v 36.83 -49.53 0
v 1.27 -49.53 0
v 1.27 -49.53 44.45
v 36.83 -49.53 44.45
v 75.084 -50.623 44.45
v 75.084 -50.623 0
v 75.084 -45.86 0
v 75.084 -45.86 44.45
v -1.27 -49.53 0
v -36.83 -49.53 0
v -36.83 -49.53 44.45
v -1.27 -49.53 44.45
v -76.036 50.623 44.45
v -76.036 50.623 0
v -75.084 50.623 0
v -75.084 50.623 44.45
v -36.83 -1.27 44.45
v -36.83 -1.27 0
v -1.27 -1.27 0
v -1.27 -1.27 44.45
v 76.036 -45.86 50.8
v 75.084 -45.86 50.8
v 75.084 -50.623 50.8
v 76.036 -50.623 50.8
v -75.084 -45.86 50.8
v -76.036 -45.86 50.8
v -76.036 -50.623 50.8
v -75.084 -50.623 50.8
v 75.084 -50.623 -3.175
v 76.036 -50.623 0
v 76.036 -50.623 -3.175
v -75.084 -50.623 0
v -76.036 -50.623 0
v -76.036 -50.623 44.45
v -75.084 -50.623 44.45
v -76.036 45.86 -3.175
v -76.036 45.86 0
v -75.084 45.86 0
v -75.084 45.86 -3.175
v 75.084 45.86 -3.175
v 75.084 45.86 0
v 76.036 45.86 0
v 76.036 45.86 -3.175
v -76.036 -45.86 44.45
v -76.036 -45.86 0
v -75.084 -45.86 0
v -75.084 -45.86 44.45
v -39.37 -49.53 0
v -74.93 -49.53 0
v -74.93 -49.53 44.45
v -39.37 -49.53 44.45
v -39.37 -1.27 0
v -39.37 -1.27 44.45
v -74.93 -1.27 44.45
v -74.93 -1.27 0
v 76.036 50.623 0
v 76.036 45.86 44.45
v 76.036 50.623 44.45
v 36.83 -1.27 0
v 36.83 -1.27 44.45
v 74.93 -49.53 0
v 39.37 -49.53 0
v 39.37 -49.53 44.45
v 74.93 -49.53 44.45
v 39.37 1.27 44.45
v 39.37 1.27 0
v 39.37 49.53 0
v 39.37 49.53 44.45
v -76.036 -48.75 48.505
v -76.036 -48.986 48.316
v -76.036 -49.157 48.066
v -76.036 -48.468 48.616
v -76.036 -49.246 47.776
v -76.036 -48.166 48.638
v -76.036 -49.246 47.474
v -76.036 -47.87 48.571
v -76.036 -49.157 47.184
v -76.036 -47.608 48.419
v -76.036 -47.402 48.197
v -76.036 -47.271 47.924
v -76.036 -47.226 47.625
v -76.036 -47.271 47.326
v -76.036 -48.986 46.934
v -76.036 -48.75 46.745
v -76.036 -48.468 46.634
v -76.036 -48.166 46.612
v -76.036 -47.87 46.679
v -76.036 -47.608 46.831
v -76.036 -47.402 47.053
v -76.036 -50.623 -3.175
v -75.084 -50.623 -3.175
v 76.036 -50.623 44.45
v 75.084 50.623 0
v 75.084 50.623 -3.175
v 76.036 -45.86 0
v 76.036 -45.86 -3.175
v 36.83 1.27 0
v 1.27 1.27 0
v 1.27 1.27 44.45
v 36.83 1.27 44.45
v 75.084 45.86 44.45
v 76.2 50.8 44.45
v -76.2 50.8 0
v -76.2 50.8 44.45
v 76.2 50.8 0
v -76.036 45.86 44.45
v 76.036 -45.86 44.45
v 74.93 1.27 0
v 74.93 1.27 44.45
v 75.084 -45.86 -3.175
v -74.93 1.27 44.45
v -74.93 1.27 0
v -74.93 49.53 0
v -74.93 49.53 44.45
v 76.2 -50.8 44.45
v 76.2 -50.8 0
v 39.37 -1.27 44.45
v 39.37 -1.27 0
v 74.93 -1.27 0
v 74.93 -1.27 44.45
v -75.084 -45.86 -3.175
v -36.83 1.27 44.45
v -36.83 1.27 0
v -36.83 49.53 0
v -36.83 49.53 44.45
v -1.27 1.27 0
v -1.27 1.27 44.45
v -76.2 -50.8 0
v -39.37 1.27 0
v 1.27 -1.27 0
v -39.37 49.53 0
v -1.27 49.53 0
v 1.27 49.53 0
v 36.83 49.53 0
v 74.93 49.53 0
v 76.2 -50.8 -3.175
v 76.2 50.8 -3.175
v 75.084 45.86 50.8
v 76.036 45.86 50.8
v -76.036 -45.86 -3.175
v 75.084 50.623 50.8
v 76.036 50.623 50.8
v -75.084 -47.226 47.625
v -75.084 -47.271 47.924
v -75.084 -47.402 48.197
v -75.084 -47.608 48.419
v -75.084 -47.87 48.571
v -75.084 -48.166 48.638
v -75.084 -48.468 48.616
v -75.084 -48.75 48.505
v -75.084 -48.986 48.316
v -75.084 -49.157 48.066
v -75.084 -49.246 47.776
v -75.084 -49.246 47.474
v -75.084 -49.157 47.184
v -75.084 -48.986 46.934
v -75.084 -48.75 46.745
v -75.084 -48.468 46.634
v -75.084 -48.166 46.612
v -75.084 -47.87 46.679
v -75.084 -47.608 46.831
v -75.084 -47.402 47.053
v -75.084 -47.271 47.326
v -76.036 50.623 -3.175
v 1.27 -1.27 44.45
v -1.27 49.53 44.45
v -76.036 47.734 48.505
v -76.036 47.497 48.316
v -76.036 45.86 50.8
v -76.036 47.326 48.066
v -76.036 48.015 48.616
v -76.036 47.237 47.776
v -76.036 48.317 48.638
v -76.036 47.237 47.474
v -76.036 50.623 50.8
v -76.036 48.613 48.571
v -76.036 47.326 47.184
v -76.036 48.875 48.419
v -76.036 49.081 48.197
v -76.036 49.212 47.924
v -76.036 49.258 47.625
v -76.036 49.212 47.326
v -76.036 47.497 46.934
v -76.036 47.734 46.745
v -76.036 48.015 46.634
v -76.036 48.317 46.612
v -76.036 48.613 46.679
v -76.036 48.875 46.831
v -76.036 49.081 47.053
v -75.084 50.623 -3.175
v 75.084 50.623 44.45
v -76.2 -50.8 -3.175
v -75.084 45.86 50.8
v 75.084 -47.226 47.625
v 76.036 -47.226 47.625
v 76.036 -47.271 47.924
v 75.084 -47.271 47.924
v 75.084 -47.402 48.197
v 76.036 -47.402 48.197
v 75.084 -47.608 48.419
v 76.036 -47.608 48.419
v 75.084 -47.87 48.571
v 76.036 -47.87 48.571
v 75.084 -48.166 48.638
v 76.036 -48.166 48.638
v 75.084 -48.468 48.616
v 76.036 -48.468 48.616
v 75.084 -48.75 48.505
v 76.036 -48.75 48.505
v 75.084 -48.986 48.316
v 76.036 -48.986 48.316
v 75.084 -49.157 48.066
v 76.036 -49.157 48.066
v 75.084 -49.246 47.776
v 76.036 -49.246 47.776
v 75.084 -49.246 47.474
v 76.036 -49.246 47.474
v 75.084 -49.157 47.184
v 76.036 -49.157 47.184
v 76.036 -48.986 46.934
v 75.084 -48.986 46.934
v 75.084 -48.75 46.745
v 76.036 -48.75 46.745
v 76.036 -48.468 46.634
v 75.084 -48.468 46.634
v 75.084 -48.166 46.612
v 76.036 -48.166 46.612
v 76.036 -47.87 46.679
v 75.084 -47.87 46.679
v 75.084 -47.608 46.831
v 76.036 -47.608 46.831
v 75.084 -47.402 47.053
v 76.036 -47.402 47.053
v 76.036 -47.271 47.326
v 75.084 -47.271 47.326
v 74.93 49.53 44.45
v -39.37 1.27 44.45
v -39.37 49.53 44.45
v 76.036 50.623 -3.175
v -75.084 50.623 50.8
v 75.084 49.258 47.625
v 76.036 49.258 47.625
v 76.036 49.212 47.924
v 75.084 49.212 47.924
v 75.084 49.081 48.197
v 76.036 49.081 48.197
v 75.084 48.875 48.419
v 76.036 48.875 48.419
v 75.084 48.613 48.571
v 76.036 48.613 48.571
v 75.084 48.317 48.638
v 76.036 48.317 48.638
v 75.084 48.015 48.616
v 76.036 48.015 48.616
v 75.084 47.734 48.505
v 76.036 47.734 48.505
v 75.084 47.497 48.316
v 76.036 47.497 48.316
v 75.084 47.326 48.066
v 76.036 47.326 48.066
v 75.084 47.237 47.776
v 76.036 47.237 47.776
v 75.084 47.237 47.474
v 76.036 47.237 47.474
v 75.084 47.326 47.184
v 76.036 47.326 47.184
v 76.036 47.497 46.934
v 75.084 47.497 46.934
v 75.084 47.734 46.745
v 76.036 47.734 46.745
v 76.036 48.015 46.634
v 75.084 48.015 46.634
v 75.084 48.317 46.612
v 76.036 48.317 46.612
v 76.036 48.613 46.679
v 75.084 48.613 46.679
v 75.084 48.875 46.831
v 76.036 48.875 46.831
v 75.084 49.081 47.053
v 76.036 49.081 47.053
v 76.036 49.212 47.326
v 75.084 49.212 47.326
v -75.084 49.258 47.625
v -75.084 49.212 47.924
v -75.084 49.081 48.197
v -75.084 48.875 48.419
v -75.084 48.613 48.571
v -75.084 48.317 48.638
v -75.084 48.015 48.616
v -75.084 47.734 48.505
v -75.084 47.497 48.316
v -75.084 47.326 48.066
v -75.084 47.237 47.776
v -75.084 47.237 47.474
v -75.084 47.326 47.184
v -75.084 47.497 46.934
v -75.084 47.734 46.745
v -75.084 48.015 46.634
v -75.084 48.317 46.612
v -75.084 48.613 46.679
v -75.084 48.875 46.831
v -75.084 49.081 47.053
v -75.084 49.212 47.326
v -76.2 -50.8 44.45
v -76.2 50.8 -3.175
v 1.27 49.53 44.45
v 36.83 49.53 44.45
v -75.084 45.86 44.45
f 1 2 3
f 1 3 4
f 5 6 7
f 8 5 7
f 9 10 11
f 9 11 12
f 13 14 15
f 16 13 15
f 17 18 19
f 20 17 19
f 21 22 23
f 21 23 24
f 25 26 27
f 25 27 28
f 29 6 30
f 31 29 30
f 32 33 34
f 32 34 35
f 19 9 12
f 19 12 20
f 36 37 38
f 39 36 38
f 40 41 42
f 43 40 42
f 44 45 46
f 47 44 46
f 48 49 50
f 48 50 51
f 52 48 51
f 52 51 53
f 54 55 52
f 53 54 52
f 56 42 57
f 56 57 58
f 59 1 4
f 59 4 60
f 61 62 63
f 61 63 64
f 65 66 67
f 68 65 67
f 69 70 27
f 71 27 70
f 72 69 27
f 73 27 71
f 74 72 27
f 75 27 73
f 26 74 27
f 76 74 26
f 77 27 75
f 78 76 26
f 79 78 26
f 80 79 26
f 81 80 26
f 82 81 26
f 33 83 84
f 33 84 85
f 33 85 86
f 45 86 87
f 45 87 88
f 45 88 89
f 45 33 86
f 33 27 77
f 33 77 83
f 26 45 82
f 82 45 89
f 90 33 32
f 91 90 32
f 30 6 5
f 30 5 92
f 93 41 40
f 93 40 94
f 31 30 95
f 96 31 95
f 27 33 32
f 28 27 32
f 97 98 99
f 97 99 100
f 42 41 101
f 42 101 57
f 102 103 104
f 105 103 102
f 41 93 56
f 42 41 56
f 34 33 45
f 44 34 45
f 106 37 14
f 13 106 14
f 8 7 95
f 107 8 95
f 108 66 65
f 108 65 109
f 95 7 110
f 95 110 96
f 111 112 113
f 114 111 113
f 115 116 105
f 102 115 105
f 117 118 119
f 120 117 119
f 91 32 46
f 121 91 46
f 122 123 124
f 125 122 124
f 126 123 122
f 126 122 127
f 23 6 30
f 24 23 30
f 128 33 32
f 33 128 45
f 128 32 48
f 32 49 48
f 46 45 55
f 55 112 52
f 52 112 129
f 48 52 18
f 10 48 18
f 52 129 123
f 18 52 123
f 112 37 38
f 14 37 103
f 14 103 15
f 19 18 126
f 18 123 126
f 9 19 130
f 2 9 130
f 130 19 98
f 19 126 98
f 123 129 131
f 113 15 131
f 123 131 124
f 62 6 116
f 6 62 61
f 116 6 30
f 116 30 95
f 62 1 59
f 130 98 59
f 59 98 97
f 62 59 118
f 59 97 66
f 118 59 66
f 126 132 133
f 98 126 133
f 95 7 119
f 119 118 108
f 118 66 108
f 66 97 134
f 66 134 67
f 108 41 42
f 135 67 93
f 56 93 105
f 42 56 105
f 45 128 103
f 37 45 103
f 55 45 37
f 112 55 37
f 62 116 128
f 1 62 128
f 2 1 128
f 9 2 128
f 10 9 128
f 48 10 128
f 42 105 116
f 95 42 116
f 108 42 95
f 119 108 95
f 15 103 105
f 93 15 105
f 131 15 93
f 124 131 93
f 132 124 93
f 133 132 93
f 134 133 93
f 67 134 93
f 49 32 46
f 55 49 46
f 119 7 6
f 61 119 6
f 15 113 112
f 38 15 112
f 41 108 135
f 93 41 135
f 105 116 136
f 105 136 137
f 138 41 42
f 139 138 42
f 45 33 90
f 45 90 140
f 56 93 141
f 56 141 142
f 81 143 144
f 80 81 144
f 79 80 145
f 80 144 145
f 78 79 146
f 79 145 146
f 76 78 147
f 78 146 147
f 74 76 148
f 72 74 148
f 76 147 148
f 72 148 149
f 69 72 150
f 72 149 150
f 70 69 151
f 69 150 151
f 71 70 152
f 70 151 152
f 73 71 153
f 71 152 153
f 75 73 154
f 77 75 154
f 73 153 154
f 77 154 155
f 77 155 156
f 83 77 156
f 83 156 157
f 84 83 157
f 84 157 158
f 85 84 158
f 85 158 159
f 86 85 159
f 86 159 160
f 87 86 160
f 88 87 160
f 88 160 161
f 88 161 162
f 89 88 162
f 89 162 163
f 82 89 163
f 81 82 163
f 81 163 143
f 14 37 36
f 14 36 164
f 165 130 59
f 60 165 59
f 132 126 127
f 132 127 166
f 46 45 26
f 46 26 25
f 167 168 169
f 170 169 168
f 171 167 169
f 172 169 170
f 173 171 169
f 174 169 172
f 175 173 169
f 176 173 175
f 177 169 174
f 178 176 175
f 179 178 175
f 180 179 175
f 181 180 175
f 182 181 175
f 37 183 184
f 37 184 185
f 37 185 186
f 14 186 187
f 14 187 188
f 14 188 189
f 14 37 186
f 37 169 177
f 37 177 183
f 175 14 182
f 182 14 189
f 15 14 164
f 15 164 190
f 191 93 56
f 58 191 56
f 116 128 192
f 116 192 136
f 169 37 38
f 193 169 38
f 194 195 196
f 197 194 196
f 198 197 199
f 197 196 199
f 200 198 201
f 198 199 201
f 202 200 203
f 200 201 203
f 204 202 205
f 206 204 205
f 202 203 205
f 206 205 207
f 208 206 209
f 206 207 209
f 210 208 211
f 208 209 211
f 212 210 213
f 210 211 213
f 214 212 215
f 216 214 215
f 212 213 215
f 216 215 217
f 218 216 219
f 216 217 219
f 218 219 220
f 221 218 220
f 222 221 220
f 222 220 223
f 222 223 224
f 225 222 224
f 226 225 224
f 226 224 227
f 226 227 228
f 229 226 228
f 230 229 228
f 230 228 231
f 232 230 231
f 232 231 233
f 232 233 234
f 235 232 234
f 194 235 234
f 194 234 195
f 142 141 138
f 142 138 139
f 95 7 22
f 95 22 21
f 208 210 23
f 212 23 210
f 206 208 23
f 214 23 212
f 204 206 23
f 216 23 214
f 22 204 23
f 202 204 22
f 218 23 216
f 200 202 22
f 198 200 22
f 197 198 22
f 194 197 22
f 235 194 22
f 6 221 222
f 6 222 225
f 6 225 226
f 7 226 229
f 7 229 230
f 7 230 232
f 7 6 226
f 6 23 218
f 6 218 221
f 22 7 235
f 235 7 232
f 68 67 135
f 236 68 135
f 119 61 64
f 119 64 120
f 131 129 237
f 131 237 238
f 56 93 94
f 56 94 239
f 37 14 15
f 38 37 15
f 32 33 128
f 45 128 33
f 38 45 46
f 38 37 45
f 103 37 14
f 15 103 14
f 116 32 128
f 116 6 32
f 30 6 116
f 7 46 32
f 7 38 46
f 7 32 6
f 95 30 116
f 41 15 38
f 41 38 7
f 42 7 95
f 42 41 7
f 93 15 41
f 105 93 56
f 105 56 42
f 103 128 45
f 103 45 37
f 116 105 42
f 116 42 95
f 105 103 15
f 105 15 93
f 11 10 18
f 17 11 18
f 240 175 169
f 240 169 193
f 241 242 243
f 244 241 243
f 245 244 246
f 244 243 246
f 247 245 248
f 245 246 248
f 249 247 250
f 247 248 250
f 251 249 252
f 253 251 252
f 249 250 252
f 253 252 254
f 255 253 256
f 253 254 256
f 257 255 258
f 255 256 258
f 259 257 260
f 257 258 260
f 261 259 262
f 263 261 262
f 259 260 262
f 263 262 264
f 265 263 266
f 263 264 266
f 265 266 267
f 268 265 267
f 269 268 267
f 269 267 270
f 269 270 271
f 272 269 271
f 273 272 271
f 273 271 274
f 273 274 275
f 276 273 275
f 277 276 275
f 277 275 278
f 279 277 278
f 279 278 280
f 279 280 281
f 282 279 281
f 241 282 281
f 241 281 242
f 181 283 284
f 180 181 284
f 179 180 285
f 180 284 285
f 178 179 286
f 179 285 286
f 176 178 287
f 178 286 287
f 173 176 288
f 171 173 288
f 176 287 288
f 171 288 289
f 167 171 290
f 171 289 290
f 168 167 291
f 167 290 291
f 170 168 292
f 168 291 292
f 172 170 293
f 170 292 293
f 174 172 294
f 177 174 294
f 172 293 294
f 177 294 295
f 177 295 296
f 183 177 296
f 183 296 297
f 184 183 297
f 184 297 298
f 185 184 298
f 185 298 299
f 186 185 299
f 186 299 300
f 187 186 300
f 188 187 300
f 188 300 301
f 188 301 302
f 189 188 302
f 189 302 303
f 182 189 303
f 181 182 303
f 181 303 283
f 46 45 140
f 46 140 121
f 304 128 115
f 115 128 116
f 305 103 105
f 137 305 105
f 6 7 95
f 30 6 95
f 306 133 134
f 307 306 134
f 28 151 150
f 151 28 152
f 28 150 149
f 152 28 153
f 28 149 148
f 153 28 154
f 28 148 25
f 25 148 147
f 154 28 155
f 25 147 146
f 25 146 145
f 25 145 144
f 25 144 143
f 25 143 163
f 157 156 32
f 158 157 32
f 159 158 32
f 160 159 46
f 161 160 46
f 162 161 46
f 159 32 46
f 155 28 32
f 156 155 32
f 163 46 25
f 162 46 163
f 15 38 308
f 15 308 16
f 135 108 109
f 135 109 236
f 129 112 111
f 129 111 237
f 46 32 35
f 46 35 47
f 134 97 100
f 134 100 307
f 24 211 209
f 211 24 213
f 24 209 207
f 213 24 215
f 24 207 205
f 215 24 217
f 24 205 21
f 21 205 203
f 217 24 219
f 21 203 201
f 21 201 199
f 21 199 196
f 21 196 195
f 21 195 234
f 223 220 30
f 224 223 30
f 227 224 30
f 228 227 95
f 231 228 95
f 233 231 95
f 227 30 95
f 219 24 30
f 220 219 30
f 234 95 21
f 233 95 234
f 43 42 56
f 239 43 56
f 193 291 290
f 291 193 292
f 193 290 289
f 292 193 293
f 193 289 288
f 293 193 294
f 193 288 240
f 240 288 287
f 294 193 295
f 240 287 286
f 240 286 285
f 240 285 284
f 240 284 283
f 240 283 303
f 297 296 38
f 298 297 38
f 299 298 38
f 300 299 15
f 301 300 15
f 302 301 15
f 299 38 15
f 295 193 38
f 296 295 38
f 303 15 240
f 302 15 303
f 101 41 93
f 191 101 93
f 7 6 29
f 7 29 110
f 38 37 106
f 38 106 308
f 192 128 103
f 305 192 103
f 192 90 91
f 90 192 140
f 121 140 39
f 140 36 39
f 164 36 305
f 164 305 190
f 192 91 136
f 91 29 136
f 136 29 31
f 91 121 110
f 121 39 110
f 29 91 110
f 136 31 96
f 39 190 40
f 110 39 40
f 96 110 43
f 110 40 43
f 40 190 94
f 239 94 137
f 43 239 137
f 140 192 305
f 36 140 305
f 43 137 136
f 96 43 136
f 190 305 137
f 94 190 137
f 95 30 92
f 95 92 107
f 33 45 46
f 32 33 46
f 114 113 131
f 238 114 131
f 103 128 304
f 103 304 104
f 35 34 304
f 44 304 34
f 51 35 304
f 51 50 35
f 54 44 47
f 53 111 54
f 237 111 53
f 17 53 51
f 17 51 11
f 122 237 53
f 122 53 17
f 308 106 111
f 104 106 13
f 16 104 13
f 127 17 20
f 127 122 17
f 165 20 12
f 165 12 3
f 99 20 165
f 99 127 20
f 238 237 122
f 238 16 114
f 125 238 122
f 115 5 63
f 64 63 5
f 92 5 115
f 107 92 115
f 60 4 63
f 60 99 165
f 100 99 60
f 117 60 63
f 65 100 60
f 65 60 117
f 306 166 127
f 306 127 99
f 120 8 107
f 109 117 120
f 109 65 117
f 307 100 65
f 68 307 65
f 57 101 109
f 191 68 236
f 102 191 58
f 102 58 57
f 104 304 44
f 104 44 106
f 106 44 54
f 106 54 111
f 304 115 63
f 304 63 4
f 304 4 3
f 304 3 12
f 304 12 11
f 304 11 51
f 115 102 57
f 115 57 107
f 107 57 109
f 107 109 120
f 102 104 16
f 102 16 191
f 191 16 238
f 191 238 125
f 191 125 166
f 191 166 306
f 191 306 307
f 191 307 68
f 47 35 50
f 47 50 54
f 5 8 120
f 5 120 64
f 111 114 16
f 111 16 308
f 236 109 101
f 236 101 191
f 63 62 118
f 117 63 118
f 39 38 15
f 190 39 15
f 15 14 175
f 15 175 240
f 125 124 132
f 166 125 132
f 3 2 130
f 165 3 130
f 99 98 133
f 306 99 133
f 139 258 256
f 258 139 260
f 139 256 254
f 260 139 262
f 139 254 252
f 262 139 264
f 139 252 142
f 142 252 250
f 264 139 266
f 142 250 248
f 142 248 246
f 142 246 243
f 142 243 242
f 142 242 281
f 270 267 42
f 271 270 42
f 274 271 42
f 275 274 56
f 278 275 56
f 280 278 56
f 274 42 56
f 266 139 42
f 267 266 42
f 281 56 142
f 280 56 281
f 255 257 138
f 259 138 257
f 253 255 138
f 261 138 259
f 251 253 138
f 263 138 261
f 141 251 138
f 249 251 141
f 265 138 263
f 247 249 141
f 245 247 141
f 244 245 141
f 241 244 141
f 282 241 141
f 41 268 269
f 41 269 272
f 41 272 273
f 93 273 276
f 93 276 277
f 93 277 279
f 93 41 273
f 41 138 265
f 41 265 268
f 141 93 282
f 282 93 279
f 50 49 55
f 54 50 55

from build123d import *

# Parameters (mm, degrees)
F0_W     = 152.4
F0_H     = 101.6
F0_W_2   = 0.95208
F0_H_2   = 4.7625
F0_W_3   = 35.56
F0_H_3   = 48.26
F1_DEPTH = 3.175
F2_DEPTH = 50.8
F3_DEPTH = 44.45
F5_D     = 2.032
F6_D     = 2.032


with BuildPart() as f1:
    # F0 (on Top) → F1 (new body)
    with BuildSketch(Plane.XY):
        Rectangle(F0_W, F0_H)
        with Locations((-75.560033, -48.241567)):
            Rectangle(F0_W_2, F0_H_2, mode=Mode.SUBTRACT)
        with Locations((-57.15, -25.4)):
            Rectangle(F0_W_3, F0_H_3, mode=Mode.SUBTRACT)
        with Locations((-19.05, -25.4)):
            Rectangle(F0_W_3, F0_H_3, mode=Mode.SUBTRACT)
        with Locations((19.05, -25.4)):
            Rectangle(F0_W_3, F0_H_3, mode=Mode.SUBTRACT)
        with Locations((75.560033, -48.241567)):
            Rectangle(F0_W_2, F0_H_2, mode=Mode.SUBTRACT)
        with Locations((57.15, -25.4)):
            Rectangle(F0_W_3, F0_H_3, mode=Mode.SUBTRACT)
        with Locations((-57.15, 25.4)):
            Rectangle(F0_W_3, F0_H_3, mode=Mode.SUBTRACT)
        with Locations((-75.560033, 48.241567)):
            Rectangle(F0_W_2, F0_H_2, mode=Mode.SUBTRACT)
        with Locations((-19.05, 25.4)):
            Rectangle(F0_W_3, F0_H_3, mode=Mode.SUBTRACT)
        with Locations((19.05, 25.4)):
            Rectangle(F0_W_3, F0_H_3, mode=Mode.SUBTRACT)
        with Locations((57.15, 25.4)):
            Rectangle(F0_W_3, F0_H_3, mode=Mode.SUBTRACT)
        with Locations((75.560033, 48.241567)):
            Rectangle(F0_W_2, F0_H_2, mode=Mode.SUBTRACT)
        with Locations((-57.15, 25.4)):
            Rectangle(F0_W_3, F0_H_3)
        with Locations((-19.05, 25.4)):
            Rectangle(F0_W_3, F0_H_3)
        with Locations((19.05, 25.4)):
            Rectangle(F0_W_3, F0_H_3)
        with Locations((57.15, 25.4)):
            Rectangle(F0_W_3, F0_H_3)
        with Locations((57.15, -25.4)):
            Rectangle(F0_W_3, F0_H_3)
        with Locations((19.05, -25.4)):
            Rectangle(F0_W_3, F0_H_3)
        with Locations((-19.05, -25.4)):
            Rectangle(F0_W_3, F0_H_3)
        with Locations((-57.15, -25.4)):
            Rectangle(F0_W_3, F0_H_3)
    extrude(amount=-F1_DEPTH)


with BuildPart() as f2:
    # F0 (on Top) → F2 (new body)
    with BuildSketch(Plane.XY):
        with Locations((-75.560033, 48.241567)):
            Rectangle(F0_W_2, F0_H_2)
        with Locations((75.560033, 48.241567)):
            Rectangle(F0_W_2, F0_H_2)
        with Locations((75.560033, -48.241567)):
            Rectangle(F0_W_2, F0_H_2)
        with Locations((-75.560033, -48.241567)):
            Rectangle(F0_W_2, F0_H_2)
    extrude(amount=F2_DEPTH)

    # F5 (through all)
    with Locations(Plane(origin=(-76.036073, 0, 0), x_dir=(0, -1, 0), z_dir=(-1, 0, 0))):
        with Locations((-48.241567, 47.625)):
            Hole(F5_D / 2)

    # F6 (through all)
    with Locations(Plane(origin=(-76.036073, 0, 0), x_dir=(0, -1, 0), z_dir=(-1, 0, 0))):
        with Locations((48.241567, 47.625)):
            Hole(F6_D / 2)


with BuildPart() as f3:
    # F0 (on Top) → F3 (new body)
    with BuildSketch(Plane.XY):
        Rectangle(F0_W, F0_H)
        with Locations((-75.560033, -48.241567)):
            Rectangle(F0_W_2, F0_H_2, mode=Mode.SUBTRACT)
        with Locations((-57.15, -25.4)):
            Rectangle(F0_W_3, F0_H_3, mode=Mode.SUBTRACT)
        with Locations((-19.05, -25.4)):
            Rectangle(F0_W_3, F0_H_3, mode=Mode.SUBTRACT)
        with Locations((19.05, -25.4)):
            Rectangle(F0_W_3, F0_H_3, mode=Mode.SUBTRACT)
        with Locations((75.560033, -48.241567)):
            Rectangle(F0_W_2, F0_H_2, mode=Mode.SUBTRACT)
        with Locations((57.15, -25.4)):
            Rectangle(F0_W_3, F0_H_3, mode=Mode.SUBTRACT)
        with Locations((-57.15, 25.4)):
            Rectangle(F0_W_3, F0_H_3, mode=Mode.SUBTRACT)
        with Locations((-75.560033, 48.241567)):
            Rectangle(F0_W_2, F0_H_2, mode=Mode.SUBTRACT)
        with Locations((-19.05, 25.4)):
            Rectangle(F0_W_3, F0_H_3, mode=Mode.SUBTRACT)
        with Locations((19.05, 25.4)):
            Rectangle(F0_W_3, F0_H_3, mode=Mode.SUBTRACT)
        with Locations((57.15, 25.4)):
            Rectangle(F0_W_3, F0_H_3, mode=Mode.SUBTRACT)
        with Locations((75.560033, 48.241567)):
            Rectangle(F0_W_2, F0_H_2, mode=Mode.SUBTRACT)
    extrude(amount=F3_DEPTH)


solid = Compound([f1.part, f2.part, f3.part])
